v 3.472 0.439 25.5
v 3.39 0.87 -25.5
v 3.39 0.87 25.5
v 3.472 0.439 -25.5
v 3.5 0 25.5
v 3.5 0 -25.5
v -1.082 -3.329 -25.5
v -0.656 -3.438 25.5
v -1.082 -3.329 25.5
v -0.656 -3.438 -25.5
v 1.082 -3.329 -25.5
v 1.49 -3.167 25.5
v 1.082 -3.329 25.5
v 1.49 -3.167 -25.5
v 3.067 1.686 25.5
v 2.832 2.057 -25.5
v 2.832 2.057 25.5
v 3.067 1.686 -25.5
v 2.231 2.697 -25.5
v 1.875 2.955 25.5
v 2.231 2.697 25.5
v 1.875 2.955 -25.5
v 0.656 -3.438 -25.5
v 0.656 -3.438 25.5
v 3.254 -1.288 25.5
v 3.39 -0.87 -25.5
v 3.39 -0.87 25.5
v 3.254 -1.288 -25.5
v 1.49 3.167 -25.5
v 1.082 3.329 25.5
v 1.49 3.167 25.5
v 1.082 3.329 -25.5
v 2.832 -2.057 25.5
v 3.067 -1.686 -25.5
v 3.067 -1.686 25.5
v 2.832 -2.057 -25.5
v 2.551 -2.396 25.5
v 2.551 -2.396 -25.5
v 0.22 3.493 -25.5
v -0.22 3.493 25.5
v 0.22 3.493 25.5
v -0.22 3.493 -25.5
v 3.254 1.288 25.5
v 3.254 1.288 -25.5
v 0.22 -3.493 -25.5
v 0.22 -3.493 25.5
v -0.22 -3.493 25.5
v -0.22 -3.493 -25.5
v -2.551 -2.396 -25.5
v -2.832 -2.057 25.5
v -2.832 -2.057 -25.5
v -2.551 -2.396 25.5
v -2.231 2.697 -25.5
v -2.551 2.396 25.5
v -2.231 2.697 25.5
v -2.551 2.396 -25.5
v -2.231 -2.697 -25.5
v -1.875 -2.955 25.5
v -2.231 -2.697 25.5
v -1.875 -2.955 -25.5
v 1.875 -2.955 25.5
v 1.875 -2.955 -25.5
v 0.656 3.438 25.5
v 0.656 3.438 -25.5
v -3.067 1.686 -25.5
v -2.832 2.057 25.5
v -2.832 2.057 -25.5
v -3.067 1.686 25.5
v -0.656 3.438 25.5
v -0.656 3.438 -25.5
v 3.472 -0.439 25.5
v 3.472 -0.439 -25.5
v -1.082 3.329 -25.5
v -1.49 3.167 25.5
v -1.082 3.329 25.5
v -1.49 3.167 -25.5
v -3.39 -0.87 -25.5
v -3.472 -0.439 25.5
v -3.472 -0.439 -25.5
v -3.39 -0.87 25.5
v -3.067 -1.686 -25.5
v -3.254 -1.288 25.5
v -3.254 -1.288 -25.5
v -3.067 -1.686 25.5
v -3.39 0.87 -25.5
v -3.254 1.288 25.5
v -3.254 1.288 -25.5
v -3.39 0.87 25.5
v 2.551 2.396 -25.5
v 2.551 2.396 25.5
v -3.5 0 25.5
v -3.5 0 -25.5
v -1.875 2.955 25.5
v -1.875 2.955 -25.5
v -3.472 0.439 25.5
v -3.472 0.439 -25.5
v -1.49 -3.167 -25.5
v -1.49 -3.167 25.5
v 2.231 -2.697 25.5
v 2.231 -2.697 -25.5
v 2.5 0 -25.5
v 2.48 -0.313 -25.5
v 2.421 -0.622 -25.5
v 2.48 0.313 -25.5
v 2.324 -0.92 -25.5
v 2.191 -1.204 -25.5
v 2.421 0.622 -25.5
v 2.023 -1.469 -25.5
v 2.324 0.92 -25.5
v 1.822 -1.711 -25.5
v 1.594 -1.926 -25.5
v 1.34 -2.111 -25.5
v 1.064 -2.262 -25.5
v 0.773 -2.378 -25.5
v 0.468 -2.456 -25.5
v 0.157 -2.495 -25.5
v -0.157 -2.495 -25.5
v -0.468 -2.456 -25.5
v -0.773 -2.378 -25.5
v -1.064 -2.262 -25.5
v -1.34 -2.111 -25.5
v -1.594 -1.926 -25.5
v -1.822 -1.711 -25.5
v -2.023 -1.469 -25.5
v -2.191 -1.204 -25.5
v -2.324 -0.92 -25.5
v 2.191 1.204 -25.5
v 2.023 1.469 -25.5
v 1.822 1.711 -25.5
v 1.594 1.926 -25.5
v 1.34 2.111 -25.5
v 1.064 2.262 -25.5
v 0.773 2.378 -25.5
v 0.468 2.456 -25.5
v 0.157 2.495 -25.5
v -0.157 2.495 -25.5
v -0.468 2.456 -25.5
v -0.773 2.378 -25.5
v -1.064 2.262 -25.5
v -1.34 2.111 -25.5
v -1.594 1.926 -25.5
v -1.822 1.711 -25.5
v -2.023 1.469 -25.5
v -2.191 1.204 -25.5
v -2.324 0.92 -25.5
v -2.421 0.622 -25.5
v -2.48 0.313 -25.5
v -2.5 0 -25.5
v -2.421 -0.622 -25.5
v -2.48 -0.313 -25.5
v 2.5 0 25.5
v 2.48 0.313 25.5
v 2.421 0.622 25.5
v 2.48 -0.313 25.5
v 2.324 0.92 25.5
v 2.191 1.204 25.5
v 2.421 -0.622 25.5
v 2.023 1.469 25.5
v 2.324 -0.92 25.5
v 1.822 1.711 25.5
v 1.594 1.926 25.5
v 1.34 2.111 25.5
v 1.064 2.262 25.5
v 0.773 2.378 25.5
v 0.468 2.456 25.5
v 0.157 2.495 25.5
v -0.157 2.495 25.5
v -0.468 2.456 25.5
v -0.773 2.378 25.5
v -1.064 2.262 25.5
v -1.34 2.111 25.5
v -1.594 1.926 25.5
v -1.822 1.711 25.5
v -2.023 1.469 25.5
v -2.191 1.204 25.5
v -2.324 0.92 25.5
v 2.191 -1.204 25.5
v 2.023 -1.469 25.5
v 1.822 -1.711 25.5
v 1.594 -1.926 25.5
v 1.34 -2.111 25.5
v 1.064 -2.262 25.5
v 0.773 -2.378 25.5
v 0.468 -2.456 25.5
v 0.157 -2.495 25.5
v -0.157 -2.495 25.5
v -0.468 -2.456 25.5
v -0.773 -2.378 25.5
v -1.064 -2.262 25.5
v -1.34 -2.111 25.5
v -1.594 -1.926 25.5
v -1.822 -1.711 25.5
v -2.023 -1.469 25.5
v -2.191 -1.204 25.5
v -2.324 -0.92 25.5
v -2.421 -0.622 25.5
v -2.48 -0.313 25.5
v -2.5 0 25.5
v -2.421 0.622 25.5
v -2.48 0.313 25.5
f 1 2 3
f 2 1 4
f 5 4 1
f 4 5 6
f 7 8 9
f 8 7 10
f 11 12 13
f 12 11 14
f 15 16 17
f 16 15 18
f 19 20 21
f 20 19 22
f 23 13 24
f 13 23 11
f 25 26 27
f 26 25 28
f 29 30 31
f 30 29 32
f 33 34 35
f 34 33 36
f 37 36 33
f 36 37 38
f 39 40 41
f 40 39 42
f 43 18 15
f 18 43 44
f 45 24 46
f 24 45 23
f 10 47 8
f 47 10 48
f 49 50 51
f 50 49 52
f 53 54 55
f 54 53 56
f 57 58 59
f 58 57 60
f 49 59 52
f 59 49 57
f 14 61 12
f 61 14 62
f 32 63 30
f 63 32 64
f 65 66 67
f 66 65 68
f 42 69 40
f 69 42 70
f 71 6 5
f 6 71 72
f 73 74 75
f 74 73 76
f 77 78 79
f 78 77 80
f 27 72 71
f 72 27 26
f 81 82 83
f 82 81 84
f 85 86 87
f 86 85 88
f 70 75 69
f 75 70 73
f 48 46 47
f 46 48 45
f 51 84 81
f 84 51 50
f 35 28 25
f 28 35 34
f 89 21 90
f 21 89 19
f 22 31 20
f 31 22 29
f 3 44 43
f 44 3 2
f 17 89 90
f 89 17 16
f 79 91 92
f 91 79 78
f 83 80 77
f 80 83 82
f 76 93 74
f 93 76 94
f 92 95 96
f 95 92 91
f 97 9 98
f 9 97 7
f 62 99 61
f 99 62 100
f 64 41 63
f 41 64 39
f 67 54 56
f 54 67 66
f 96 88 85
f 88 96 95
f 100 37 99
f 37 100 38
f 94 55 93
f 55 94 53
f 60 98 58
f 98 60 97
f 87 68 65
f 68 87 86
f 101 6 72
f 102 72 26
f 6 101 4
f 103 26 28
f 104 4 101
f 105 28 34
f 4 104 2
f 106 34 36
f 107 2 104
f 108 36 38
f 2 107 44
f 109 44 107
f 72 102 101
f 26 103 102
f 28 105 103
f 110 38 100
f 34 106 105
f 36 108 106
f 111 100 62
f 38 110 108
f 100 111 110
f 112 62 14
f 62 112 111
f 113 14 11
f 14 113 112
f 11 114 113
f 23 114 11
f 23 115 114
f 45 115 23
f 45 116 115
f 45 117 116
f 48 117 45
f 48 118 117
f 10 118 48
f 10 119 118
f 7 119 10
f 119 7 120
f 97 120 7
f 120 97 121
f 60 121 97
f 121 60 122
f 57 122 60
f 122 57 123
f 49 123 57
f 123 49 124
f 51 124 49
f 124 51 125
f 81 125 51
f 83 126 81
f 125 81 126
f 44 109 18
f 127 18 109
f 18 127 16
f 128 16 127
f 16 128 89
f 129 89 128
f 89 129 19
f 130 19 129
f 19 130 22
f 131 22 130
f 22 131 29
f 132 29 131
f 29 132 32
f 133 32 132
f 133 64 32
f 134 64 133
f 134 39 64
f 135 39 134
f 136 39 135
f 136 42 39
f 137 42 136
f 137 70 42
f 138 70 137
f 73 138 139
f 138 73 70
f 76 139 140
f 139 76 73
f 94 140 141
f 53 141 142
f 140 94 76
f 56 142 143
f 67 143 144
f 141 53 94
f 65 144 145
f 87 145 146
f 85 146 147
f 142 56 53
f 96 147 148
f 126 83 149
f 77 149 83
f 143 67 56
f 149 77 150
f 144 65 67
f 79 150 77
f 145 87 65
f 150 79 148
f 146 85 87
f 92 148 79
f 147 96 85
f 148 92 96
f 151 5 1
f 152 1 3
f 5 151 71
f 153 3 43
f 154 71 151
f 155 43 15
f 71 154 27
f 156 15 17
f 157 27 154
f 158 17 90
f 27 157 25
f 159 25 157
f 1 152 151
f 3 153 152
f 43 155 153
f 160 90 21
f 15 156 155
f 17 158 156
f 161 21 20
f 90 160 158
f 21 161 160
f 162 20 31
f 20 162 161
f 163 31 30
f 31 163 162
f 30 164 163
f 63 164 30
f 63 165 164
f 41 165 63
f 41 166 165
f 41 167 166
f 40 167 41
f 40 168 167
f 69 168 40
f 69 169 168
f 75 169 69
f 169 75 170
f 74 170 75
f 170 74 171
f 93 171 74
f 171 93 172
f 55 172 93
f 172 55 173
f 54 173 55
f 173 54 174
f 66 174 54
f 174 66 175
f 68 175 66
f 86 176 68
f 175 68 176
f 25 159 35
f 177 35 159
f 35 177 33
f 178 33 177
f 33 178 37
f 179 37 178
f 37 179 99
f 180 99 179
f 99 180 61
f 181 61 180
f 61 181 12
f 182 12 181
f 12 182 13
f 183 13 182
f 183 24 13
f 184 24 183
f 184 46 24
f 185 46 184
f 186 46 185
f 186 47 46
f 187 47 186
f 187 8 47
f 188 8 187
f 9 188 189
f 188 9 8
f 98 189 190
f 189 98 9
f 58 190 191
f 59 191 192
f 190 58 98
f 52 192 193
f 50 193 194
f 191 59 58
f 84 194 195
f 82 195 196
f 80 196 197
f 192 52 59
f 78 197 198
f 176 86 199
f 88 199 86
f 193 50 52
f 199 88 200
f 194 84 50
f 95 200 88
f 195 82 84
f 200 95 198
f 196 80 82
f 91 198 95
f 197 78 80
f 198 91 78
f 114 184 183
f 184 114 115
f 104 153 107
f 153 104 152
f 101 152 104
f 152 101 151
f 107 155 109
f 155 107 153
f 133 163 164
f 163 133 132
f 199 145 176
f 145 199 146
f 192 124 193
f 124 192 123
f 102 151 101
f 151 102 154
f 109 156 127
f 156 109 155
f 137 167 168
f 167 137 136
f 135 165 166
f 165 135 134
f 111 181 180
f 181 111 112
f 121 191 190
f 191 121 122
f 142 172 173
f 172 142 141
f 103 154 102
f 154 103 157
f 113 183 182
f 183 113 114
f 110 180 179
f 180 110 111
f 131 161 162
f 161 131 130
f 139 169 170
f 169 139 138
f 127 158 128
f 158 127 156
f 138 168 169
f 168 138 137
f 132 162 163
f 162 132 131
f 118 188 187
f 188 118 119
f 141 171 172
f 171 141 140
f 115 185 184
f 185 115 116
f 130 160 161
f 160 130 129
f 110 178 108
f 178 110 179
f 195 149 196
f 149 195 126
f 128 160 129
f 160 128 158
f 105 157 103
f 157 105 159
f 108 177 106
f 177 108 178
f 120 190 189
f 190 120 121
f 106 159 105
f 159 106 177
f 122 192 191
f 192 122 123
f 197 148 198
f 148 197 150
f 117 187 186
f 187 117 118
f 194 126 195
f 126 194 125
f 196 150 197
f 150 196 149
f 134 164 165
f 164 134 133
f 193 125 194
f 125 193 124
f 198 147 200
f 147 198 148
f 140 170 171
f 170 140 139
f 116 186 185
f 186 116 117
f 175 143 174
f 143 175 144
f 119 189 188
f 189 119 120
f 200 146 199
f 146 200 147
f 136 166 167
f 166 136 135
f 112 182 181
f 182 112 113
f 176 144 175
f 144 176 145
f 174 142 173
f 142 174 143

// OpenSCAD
$fn = 50;


difference() {
	union() {
		translate(v = [0, 0, -25.5000000000]) {
			cylinder(h = 51, r = 3.5000000000);
		}
	}
	union() {
		translate(v = [0, 0, -100.0000000000]) {
			cylinder(h = 200, r = 2.5000000000);
		}
	}
}
